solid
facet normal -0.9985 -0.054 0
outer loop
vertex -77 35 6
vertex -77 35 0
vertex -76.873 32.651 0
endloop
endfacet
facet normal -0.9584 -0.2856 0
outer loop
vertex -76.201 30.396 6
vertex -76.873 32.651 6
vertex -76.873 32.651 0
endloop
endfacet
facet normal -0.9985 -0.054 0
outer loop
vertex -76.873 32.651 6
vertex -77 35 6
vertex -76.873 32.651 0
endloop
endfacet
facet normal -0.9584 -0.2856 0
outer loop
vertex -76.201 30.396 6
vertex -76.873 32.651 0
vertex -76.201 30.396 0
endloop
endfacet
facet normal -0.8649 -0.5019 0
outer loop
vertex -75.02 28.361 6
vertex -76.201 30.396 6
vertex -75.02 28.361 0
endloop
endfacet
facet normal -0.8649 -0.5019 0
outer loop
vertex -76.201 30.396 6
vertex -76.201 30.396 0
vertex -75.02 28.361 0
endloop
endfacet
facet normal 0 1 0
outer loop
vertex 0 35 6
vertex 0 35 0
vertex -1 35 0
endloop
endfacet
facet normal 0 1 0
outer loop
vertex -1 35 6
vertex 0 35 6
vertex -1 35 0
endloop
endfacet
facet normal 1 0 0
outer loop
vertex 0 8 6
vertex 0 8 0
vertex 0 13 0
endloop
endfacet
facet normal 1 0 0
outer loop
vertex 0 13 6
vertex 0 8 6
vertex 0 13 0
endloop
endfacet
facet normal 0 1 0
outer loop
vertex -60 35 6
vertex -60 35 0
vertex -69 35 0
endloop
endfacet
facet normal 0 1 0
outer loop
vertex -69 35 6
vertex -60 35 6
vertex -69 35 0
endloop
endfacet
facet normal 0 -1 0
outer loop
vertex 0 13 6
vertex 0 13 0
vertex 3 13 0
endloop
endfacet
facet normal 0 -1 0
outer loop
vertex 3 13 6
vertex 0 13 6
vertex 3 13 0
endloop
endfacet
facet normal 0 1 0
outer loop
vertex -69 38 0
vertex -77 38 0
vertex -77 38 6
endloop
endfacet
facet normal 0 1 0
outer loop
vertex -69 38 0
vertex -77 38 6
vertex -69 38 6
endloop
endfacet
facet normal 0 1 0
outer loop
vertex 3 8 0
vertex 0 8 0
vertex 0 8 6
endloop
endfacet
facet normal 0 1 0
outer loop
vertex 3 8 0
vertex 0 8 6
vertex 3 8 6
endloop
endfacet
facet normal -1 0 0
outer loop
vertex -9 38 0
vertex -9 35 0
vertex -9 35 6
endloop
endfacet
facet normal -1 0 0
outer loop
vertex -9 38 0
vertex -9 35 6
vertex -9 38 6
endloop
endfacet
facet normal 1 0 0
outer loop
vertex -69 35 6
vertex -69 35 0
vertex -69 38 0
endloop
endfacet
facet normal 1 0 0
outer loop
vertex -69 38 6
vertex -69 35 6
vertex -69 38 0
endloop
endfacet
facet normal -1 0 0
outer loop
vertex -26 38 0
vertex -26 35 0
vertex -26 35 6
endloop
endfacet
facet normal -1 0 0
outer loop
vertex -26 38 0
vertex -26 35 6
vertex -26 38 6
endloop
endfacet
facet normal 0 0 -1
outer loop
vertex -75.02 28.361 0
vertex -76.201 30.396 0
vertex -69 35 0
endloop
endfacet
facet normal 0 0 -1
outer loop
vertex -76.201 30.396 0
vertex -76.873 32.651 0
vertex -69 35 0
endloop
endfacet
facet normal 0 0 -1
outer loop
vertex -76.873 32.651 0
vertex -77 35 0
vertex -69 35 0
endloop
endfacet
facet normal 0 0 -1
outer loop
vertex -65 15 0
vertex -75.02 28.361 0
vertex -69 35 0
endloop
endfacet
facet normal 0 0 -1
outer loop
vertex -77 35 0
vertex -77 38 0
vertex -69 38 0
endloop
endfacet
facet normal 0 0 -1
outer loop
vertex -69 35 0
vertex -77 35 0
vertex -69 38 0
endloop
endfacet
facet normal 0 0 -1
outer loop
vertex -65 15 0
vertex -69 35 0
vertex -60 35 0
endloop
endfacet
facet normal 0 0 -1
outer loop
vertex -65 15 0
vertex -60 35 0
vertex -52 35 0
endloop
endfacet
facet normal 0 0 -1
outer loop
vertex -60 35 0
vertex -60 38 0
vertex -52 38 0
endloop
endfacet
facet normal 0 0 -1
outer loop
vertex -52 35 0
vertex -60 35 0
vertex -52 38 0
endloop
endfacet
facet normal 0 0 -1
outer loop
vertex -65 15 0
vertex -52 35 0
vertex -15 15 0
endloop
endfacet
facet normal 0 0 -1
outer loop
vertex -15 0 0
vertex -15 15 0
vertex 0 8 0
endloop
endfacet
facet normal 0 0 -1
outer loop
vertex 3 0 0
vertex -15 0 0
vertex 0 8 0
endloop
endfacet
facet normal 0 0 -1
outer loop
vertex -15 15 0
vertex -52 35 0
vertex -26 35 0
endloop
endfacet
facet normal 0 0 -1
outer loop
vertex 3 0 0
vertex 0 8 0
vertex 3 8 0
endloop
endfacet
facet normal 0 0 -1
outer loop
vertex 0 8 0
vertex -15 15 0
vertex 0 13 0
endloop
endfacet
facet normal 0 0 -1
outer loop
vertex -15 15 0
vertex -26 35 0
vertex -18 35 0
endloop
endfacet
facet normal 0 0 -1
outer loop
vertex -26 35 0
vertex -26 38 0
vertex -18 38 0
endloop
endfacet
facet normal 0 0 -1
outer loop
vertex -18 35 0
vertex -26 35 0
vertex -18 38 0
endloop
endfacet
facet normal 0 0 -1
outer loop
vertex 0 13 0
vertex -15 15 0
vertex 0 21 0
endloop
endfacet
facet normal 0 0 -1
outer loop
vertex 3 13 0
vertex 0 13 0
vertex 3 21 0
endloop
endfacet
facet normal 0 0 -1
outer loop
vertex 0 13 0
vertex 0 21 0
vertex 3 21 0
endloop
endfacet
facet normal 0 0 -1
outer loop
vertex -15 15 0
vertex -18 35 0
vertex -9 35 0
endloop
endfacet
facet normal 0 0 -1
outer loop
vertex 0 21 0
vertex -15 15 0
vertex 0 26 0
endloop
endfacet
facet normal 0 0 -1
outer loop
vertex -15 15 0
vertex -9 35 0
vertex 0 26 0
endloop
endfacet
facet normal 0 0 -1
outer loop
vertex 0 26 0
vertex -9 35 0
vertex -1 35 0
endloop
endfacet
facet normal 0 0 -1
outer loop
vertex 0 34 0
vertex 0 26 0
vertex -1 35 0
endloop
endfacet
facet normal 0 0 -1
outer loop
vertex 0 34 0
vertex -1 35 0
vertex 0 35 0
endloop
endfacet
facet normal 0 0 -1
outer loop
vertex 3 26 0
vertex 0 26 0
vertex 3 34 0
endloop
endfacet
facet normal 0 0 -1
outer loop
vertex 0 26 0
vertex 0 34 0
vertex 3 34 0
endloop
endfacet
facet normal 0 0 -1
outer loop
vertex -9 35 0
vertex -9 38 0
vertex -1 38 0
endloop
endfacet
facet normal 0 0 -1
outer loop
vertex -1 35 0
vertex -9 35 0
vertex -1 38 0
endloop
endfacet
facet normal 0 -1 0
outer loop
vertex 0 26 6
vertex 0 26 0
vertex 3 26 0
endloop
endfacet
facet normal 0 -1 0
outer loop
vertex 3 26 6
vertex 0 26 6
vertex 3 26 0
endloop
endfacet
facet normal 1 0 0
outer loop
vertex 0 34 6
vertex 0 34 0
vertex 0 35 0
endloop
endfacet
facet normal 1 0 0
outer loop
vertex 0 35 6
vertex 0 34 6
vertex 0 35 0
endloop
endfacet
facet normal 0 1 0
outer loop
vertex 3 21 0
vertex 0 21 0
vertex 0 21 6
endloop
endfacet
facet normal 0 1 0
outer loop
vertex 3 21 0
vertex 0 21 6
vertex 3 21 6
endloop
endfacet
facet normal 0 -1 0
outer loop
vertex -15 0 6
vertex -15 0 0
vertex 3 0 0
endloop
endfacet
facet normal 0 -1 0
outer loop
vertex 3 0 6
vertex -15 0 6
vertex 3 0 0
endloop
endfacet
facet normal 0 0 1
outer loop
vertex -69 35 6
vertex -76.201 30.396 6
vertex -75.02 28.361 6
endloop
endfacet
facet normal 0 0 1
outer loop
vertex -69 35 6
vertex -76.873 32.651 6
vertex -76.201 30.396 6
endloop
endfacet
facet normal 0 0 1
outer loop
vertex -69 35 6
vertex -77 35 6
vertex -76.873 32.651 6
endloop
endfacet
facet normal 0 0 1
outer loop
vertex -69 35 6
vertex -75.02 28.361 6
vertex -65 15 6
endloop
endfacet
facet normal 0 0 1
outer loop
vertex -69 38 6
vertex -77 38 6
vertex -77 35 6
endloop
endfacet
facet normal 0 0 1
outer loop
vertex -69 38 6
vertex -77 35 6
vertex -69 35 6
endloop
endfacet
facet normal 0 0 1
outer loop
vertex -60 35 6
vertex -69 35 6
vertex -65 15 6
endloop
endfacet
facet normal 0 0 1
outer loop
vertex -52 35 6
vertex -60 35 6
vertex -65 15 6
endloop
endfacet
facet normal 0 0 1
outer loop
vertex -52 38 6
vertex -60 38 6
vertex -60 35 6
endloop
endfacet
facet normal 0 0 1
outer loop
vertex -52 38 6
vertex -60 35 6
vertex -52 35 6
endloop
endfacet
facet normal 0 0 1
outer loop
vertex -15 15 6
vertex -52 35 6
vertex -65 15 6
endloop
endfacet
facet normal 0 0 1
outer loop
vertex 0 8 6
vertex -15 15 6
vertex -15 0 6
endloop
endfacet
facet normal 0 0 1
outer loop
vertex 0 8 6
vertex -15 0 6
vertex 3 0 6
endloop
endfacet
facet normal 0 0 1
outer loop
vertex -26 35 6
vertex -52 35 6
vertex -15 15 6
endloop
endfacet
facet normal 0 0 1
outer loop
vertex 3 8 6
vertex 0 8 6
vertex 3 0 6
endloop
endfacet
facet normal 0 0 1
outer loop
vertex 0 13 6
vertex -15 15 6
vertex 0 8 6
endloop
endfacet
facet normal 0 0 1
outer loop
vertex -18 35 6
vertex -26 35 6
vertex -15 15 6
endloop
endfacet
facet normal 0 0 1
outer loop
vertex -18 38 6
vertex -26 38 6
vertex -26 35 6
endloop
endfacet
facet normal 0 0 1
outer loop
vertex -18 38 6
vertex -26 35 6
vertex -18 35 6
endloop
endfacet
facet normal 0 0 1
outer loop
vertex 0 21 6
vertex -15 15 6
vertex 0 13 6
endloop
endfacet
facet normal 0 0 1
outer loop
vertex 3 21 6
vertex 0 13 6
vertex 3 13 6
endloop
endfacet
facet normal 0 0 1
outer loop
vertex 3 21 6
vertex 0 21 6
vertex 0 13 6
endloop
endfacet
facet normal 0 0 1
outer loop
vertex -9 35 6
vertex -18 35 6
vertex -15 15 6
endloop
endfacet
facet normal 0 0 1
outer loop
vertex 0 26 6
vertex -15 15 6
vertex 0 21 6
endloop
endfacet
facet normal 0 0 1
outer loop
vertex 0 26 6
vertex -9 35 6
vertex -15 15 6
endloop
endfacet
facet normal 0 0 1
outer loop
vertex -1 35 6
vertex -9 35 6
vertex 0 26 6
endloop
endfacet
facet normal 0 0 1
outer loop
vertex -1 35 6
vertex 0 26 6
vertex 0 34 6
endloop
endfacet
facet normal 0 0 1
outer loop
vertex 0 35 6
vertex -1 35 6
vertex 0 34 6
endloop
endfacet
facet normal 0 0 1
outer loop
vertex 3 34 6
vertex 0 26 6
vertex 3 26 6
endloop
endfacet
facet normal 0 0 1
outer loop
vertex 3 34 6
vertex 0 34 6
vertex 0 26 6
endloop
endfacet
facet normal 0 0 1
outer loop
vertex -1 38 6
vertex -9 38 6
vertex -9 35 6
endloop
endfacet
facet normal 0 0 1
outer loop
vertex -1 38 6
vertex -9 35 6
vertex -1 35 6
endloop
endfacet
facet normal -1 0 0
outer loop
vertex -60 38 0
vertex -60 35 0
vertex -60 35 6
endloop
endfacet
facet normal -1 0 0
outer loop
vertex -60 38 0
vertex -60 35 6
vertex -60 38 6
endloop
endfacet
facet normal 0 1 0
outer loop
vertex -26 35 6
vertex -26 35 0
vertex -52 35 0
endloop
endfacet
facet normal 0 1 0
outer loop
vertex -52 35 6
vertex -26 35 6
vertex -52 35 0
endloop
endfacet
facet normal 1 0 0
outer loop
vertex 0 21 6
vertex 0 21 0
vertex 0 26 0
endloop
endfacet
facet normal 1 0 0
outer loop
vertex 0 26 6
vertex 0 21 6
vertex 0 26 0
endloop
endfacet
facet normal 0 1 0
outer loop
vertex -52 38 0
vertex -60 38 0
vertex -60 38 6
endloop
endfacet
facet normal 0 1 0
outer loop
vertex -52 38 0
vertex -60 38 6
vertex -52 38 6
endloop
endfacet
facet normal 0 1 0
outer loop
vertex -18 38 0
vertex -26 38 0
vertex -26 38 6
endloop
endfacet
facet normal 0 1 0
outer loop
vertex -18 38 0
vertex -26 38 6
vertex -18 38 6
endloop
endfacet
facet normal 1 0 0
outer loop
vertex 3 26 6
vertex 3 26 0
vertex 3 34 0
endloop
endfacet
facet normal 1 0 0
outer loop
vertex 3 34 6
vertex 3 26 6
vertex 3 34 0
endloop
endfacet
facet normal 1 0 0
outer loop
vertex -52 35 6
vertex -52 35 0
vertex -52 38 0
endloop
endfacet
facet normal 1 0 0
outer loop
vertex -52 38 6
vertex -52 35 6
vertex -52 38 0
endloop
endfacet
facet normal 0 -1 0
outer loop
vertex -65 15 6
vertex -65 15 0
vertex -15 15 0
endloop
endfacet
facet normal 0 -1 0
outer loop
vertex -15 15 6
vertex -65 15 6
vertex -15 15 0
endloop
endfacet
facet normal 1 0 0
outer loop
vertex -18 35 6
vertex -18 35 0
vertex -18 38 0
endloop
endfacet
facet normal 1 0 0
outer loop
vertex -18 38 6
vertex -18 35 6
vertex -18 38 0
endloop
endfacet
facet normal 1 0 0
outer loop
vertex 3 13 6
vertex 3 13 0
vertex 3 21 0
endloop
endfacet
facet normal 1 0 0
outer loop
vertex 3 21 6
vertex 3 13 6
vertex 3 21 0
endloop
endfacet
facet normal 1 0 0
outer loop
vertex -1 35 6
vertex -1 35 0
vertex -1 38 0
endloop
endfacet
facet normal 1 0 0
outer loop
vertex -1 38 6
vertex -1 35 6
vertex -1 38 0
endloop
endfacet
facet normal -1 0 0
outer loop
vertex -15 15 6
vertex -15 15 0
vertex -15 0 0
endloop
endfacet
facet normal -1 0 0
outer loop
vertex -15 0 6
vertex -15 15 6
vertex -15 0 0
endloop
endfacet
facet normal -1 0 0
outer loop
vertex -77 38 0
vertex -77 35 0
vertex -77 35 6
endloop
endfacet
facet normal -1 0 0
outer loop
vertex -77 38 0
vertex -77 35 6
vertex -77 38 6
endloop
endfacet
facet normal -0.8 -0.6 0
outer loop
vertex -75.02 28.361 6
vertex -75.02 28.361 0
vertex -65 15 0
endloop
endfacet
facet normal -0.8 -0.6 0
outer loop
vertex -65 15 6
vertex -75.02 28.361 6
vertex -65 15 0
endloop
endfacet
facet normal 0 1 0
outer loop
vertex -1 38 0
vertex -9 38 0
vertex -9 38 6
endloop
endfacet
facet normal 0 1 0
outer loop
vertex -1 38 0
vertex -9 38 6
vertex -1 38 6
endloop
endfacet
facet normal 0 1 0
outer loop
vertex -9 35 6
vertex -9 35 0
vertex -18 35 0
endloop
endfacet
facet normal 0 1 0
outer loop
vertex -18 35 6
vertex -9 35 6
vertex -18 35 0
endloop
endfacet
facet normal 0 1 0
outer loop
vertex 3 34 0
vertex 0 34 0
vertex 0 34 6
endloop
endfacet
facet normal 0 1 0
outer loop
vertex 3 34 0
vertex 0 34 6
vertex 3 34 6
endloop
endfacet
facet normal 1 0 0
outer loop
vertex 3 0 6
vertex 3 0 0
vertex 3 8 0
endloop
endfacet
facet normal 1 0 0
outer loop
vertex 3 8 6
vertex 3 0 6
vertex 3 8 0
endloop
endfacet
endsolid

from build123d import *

# Parameters (mm, degrees)
ESQUISSE1_W             = 8
ESQUISSE1_H             = 3
ESQUISSE1_W_2           = 3
ESQUISSE1_H_2           = 8
BOSS_EXTRU_1_DEPTH      = 6
CONG_1_R                = 10
ESQUISSE2_W             = 8
ESQUISSE2_H             = 6
ENL_V_MAT_EXTRU_1_DEPTH = 3


with BuildPart() as part:
    # Esquisse1 → Boss.-Extru.1 (new body)
    with BuildSketch(Plane.XY):
        Polygon((-60, 35), (-69, 35), (-77, 35), (-80, 35), (-65, 15), (-15, 15), (-15, 0), (0, 0), (0, 8), (0, 13), (0, 21), (0, 26), (0, 34), (0, 35), (-1, 35), (-9, 35), (-18, 35), (-26, 35), (-35, 35), (-43, 35), (-52, 35), align=None)
        with Locations((-56, 36.5)):
            Rectangle(ESQUISSE1_W, ESQUISSE1_H)
        with Locations((-39, 36.5)):
            Rectangle(ESQUISSE1_W, ESQUISSE1_H)
        with Locations((-22, 36.5)):
            Rectangle(ESQUISSE1_W, ESQUISSE1_H)
        with Locations((-5, 36.5)):
            Rectangle(ESQUISSE1_W, ESQUISSE1_H)
        with Locations((1.5, 30)):
            Rectangle(ESQUISSE1_W_2, ESQUISSE1_H_2)
        with Locations((1.5, 17)):
            Rectangle(ESQUISSE1_W_2, ESQUISSE1_H_2)
        with Locations((1.5, 4)):
            Rectangle(ESQUISSE1_W_2, ESQUISSE1_H_2)
        with Locations((-73, 36.5)):
            Rectangle(ESQUISSE1_W, ESQUISSE1_H)
    extrude(amount=BOSS_EXTRU_1_DEPTH)

    # Congé1
    # the kernel refuses this fillet: 10 mm, written as the material it takes off along each edge
    with BuildSketch(Plane(origin=(-80, 35, -20.748076809), x_dir=(1, 0, 0), z_dir=(0, 0, 1))) as cong_1_piece_1:
        with BuildLine():
            CenterArc((12.979538434, -0.639384579), CONG_1_R, 176.334095535, 40.535802111)
            Line((4.979538434, -6.639384579), (4.819538434, -6.759384579))
            Line((4.819538434, -6.759384579), (-0.16, -0.12))
            Line((-0.16, -0.12), (0, 0.2))
            ThreePointArc((0, 0.2), (1.5, 0.2), (2.800409231, 0.012787692))
            Line((2.800409231, 0.012787692), (3, 0))
        make_face()
    extrude(amount=47.496153619, mode=Mode.SUBTRACT)

    # Esquisse2 → Enlèv. mat.-Extru.1 (cut)
    with BuildSketch(Plane(origin=(0, 38, 0), x_dir=(1, 0, 0), z_dir=(0, 1, 0))):
        with Locations((-39, -3)):
            Rectangle(ESQUISSE2_W, ESQUISSE2_H)
    extrude(amount=-ENL_V_MAT_EXTRU_1_DEPTH, mode=Mode.SUBTRACT)


solid = part.part
